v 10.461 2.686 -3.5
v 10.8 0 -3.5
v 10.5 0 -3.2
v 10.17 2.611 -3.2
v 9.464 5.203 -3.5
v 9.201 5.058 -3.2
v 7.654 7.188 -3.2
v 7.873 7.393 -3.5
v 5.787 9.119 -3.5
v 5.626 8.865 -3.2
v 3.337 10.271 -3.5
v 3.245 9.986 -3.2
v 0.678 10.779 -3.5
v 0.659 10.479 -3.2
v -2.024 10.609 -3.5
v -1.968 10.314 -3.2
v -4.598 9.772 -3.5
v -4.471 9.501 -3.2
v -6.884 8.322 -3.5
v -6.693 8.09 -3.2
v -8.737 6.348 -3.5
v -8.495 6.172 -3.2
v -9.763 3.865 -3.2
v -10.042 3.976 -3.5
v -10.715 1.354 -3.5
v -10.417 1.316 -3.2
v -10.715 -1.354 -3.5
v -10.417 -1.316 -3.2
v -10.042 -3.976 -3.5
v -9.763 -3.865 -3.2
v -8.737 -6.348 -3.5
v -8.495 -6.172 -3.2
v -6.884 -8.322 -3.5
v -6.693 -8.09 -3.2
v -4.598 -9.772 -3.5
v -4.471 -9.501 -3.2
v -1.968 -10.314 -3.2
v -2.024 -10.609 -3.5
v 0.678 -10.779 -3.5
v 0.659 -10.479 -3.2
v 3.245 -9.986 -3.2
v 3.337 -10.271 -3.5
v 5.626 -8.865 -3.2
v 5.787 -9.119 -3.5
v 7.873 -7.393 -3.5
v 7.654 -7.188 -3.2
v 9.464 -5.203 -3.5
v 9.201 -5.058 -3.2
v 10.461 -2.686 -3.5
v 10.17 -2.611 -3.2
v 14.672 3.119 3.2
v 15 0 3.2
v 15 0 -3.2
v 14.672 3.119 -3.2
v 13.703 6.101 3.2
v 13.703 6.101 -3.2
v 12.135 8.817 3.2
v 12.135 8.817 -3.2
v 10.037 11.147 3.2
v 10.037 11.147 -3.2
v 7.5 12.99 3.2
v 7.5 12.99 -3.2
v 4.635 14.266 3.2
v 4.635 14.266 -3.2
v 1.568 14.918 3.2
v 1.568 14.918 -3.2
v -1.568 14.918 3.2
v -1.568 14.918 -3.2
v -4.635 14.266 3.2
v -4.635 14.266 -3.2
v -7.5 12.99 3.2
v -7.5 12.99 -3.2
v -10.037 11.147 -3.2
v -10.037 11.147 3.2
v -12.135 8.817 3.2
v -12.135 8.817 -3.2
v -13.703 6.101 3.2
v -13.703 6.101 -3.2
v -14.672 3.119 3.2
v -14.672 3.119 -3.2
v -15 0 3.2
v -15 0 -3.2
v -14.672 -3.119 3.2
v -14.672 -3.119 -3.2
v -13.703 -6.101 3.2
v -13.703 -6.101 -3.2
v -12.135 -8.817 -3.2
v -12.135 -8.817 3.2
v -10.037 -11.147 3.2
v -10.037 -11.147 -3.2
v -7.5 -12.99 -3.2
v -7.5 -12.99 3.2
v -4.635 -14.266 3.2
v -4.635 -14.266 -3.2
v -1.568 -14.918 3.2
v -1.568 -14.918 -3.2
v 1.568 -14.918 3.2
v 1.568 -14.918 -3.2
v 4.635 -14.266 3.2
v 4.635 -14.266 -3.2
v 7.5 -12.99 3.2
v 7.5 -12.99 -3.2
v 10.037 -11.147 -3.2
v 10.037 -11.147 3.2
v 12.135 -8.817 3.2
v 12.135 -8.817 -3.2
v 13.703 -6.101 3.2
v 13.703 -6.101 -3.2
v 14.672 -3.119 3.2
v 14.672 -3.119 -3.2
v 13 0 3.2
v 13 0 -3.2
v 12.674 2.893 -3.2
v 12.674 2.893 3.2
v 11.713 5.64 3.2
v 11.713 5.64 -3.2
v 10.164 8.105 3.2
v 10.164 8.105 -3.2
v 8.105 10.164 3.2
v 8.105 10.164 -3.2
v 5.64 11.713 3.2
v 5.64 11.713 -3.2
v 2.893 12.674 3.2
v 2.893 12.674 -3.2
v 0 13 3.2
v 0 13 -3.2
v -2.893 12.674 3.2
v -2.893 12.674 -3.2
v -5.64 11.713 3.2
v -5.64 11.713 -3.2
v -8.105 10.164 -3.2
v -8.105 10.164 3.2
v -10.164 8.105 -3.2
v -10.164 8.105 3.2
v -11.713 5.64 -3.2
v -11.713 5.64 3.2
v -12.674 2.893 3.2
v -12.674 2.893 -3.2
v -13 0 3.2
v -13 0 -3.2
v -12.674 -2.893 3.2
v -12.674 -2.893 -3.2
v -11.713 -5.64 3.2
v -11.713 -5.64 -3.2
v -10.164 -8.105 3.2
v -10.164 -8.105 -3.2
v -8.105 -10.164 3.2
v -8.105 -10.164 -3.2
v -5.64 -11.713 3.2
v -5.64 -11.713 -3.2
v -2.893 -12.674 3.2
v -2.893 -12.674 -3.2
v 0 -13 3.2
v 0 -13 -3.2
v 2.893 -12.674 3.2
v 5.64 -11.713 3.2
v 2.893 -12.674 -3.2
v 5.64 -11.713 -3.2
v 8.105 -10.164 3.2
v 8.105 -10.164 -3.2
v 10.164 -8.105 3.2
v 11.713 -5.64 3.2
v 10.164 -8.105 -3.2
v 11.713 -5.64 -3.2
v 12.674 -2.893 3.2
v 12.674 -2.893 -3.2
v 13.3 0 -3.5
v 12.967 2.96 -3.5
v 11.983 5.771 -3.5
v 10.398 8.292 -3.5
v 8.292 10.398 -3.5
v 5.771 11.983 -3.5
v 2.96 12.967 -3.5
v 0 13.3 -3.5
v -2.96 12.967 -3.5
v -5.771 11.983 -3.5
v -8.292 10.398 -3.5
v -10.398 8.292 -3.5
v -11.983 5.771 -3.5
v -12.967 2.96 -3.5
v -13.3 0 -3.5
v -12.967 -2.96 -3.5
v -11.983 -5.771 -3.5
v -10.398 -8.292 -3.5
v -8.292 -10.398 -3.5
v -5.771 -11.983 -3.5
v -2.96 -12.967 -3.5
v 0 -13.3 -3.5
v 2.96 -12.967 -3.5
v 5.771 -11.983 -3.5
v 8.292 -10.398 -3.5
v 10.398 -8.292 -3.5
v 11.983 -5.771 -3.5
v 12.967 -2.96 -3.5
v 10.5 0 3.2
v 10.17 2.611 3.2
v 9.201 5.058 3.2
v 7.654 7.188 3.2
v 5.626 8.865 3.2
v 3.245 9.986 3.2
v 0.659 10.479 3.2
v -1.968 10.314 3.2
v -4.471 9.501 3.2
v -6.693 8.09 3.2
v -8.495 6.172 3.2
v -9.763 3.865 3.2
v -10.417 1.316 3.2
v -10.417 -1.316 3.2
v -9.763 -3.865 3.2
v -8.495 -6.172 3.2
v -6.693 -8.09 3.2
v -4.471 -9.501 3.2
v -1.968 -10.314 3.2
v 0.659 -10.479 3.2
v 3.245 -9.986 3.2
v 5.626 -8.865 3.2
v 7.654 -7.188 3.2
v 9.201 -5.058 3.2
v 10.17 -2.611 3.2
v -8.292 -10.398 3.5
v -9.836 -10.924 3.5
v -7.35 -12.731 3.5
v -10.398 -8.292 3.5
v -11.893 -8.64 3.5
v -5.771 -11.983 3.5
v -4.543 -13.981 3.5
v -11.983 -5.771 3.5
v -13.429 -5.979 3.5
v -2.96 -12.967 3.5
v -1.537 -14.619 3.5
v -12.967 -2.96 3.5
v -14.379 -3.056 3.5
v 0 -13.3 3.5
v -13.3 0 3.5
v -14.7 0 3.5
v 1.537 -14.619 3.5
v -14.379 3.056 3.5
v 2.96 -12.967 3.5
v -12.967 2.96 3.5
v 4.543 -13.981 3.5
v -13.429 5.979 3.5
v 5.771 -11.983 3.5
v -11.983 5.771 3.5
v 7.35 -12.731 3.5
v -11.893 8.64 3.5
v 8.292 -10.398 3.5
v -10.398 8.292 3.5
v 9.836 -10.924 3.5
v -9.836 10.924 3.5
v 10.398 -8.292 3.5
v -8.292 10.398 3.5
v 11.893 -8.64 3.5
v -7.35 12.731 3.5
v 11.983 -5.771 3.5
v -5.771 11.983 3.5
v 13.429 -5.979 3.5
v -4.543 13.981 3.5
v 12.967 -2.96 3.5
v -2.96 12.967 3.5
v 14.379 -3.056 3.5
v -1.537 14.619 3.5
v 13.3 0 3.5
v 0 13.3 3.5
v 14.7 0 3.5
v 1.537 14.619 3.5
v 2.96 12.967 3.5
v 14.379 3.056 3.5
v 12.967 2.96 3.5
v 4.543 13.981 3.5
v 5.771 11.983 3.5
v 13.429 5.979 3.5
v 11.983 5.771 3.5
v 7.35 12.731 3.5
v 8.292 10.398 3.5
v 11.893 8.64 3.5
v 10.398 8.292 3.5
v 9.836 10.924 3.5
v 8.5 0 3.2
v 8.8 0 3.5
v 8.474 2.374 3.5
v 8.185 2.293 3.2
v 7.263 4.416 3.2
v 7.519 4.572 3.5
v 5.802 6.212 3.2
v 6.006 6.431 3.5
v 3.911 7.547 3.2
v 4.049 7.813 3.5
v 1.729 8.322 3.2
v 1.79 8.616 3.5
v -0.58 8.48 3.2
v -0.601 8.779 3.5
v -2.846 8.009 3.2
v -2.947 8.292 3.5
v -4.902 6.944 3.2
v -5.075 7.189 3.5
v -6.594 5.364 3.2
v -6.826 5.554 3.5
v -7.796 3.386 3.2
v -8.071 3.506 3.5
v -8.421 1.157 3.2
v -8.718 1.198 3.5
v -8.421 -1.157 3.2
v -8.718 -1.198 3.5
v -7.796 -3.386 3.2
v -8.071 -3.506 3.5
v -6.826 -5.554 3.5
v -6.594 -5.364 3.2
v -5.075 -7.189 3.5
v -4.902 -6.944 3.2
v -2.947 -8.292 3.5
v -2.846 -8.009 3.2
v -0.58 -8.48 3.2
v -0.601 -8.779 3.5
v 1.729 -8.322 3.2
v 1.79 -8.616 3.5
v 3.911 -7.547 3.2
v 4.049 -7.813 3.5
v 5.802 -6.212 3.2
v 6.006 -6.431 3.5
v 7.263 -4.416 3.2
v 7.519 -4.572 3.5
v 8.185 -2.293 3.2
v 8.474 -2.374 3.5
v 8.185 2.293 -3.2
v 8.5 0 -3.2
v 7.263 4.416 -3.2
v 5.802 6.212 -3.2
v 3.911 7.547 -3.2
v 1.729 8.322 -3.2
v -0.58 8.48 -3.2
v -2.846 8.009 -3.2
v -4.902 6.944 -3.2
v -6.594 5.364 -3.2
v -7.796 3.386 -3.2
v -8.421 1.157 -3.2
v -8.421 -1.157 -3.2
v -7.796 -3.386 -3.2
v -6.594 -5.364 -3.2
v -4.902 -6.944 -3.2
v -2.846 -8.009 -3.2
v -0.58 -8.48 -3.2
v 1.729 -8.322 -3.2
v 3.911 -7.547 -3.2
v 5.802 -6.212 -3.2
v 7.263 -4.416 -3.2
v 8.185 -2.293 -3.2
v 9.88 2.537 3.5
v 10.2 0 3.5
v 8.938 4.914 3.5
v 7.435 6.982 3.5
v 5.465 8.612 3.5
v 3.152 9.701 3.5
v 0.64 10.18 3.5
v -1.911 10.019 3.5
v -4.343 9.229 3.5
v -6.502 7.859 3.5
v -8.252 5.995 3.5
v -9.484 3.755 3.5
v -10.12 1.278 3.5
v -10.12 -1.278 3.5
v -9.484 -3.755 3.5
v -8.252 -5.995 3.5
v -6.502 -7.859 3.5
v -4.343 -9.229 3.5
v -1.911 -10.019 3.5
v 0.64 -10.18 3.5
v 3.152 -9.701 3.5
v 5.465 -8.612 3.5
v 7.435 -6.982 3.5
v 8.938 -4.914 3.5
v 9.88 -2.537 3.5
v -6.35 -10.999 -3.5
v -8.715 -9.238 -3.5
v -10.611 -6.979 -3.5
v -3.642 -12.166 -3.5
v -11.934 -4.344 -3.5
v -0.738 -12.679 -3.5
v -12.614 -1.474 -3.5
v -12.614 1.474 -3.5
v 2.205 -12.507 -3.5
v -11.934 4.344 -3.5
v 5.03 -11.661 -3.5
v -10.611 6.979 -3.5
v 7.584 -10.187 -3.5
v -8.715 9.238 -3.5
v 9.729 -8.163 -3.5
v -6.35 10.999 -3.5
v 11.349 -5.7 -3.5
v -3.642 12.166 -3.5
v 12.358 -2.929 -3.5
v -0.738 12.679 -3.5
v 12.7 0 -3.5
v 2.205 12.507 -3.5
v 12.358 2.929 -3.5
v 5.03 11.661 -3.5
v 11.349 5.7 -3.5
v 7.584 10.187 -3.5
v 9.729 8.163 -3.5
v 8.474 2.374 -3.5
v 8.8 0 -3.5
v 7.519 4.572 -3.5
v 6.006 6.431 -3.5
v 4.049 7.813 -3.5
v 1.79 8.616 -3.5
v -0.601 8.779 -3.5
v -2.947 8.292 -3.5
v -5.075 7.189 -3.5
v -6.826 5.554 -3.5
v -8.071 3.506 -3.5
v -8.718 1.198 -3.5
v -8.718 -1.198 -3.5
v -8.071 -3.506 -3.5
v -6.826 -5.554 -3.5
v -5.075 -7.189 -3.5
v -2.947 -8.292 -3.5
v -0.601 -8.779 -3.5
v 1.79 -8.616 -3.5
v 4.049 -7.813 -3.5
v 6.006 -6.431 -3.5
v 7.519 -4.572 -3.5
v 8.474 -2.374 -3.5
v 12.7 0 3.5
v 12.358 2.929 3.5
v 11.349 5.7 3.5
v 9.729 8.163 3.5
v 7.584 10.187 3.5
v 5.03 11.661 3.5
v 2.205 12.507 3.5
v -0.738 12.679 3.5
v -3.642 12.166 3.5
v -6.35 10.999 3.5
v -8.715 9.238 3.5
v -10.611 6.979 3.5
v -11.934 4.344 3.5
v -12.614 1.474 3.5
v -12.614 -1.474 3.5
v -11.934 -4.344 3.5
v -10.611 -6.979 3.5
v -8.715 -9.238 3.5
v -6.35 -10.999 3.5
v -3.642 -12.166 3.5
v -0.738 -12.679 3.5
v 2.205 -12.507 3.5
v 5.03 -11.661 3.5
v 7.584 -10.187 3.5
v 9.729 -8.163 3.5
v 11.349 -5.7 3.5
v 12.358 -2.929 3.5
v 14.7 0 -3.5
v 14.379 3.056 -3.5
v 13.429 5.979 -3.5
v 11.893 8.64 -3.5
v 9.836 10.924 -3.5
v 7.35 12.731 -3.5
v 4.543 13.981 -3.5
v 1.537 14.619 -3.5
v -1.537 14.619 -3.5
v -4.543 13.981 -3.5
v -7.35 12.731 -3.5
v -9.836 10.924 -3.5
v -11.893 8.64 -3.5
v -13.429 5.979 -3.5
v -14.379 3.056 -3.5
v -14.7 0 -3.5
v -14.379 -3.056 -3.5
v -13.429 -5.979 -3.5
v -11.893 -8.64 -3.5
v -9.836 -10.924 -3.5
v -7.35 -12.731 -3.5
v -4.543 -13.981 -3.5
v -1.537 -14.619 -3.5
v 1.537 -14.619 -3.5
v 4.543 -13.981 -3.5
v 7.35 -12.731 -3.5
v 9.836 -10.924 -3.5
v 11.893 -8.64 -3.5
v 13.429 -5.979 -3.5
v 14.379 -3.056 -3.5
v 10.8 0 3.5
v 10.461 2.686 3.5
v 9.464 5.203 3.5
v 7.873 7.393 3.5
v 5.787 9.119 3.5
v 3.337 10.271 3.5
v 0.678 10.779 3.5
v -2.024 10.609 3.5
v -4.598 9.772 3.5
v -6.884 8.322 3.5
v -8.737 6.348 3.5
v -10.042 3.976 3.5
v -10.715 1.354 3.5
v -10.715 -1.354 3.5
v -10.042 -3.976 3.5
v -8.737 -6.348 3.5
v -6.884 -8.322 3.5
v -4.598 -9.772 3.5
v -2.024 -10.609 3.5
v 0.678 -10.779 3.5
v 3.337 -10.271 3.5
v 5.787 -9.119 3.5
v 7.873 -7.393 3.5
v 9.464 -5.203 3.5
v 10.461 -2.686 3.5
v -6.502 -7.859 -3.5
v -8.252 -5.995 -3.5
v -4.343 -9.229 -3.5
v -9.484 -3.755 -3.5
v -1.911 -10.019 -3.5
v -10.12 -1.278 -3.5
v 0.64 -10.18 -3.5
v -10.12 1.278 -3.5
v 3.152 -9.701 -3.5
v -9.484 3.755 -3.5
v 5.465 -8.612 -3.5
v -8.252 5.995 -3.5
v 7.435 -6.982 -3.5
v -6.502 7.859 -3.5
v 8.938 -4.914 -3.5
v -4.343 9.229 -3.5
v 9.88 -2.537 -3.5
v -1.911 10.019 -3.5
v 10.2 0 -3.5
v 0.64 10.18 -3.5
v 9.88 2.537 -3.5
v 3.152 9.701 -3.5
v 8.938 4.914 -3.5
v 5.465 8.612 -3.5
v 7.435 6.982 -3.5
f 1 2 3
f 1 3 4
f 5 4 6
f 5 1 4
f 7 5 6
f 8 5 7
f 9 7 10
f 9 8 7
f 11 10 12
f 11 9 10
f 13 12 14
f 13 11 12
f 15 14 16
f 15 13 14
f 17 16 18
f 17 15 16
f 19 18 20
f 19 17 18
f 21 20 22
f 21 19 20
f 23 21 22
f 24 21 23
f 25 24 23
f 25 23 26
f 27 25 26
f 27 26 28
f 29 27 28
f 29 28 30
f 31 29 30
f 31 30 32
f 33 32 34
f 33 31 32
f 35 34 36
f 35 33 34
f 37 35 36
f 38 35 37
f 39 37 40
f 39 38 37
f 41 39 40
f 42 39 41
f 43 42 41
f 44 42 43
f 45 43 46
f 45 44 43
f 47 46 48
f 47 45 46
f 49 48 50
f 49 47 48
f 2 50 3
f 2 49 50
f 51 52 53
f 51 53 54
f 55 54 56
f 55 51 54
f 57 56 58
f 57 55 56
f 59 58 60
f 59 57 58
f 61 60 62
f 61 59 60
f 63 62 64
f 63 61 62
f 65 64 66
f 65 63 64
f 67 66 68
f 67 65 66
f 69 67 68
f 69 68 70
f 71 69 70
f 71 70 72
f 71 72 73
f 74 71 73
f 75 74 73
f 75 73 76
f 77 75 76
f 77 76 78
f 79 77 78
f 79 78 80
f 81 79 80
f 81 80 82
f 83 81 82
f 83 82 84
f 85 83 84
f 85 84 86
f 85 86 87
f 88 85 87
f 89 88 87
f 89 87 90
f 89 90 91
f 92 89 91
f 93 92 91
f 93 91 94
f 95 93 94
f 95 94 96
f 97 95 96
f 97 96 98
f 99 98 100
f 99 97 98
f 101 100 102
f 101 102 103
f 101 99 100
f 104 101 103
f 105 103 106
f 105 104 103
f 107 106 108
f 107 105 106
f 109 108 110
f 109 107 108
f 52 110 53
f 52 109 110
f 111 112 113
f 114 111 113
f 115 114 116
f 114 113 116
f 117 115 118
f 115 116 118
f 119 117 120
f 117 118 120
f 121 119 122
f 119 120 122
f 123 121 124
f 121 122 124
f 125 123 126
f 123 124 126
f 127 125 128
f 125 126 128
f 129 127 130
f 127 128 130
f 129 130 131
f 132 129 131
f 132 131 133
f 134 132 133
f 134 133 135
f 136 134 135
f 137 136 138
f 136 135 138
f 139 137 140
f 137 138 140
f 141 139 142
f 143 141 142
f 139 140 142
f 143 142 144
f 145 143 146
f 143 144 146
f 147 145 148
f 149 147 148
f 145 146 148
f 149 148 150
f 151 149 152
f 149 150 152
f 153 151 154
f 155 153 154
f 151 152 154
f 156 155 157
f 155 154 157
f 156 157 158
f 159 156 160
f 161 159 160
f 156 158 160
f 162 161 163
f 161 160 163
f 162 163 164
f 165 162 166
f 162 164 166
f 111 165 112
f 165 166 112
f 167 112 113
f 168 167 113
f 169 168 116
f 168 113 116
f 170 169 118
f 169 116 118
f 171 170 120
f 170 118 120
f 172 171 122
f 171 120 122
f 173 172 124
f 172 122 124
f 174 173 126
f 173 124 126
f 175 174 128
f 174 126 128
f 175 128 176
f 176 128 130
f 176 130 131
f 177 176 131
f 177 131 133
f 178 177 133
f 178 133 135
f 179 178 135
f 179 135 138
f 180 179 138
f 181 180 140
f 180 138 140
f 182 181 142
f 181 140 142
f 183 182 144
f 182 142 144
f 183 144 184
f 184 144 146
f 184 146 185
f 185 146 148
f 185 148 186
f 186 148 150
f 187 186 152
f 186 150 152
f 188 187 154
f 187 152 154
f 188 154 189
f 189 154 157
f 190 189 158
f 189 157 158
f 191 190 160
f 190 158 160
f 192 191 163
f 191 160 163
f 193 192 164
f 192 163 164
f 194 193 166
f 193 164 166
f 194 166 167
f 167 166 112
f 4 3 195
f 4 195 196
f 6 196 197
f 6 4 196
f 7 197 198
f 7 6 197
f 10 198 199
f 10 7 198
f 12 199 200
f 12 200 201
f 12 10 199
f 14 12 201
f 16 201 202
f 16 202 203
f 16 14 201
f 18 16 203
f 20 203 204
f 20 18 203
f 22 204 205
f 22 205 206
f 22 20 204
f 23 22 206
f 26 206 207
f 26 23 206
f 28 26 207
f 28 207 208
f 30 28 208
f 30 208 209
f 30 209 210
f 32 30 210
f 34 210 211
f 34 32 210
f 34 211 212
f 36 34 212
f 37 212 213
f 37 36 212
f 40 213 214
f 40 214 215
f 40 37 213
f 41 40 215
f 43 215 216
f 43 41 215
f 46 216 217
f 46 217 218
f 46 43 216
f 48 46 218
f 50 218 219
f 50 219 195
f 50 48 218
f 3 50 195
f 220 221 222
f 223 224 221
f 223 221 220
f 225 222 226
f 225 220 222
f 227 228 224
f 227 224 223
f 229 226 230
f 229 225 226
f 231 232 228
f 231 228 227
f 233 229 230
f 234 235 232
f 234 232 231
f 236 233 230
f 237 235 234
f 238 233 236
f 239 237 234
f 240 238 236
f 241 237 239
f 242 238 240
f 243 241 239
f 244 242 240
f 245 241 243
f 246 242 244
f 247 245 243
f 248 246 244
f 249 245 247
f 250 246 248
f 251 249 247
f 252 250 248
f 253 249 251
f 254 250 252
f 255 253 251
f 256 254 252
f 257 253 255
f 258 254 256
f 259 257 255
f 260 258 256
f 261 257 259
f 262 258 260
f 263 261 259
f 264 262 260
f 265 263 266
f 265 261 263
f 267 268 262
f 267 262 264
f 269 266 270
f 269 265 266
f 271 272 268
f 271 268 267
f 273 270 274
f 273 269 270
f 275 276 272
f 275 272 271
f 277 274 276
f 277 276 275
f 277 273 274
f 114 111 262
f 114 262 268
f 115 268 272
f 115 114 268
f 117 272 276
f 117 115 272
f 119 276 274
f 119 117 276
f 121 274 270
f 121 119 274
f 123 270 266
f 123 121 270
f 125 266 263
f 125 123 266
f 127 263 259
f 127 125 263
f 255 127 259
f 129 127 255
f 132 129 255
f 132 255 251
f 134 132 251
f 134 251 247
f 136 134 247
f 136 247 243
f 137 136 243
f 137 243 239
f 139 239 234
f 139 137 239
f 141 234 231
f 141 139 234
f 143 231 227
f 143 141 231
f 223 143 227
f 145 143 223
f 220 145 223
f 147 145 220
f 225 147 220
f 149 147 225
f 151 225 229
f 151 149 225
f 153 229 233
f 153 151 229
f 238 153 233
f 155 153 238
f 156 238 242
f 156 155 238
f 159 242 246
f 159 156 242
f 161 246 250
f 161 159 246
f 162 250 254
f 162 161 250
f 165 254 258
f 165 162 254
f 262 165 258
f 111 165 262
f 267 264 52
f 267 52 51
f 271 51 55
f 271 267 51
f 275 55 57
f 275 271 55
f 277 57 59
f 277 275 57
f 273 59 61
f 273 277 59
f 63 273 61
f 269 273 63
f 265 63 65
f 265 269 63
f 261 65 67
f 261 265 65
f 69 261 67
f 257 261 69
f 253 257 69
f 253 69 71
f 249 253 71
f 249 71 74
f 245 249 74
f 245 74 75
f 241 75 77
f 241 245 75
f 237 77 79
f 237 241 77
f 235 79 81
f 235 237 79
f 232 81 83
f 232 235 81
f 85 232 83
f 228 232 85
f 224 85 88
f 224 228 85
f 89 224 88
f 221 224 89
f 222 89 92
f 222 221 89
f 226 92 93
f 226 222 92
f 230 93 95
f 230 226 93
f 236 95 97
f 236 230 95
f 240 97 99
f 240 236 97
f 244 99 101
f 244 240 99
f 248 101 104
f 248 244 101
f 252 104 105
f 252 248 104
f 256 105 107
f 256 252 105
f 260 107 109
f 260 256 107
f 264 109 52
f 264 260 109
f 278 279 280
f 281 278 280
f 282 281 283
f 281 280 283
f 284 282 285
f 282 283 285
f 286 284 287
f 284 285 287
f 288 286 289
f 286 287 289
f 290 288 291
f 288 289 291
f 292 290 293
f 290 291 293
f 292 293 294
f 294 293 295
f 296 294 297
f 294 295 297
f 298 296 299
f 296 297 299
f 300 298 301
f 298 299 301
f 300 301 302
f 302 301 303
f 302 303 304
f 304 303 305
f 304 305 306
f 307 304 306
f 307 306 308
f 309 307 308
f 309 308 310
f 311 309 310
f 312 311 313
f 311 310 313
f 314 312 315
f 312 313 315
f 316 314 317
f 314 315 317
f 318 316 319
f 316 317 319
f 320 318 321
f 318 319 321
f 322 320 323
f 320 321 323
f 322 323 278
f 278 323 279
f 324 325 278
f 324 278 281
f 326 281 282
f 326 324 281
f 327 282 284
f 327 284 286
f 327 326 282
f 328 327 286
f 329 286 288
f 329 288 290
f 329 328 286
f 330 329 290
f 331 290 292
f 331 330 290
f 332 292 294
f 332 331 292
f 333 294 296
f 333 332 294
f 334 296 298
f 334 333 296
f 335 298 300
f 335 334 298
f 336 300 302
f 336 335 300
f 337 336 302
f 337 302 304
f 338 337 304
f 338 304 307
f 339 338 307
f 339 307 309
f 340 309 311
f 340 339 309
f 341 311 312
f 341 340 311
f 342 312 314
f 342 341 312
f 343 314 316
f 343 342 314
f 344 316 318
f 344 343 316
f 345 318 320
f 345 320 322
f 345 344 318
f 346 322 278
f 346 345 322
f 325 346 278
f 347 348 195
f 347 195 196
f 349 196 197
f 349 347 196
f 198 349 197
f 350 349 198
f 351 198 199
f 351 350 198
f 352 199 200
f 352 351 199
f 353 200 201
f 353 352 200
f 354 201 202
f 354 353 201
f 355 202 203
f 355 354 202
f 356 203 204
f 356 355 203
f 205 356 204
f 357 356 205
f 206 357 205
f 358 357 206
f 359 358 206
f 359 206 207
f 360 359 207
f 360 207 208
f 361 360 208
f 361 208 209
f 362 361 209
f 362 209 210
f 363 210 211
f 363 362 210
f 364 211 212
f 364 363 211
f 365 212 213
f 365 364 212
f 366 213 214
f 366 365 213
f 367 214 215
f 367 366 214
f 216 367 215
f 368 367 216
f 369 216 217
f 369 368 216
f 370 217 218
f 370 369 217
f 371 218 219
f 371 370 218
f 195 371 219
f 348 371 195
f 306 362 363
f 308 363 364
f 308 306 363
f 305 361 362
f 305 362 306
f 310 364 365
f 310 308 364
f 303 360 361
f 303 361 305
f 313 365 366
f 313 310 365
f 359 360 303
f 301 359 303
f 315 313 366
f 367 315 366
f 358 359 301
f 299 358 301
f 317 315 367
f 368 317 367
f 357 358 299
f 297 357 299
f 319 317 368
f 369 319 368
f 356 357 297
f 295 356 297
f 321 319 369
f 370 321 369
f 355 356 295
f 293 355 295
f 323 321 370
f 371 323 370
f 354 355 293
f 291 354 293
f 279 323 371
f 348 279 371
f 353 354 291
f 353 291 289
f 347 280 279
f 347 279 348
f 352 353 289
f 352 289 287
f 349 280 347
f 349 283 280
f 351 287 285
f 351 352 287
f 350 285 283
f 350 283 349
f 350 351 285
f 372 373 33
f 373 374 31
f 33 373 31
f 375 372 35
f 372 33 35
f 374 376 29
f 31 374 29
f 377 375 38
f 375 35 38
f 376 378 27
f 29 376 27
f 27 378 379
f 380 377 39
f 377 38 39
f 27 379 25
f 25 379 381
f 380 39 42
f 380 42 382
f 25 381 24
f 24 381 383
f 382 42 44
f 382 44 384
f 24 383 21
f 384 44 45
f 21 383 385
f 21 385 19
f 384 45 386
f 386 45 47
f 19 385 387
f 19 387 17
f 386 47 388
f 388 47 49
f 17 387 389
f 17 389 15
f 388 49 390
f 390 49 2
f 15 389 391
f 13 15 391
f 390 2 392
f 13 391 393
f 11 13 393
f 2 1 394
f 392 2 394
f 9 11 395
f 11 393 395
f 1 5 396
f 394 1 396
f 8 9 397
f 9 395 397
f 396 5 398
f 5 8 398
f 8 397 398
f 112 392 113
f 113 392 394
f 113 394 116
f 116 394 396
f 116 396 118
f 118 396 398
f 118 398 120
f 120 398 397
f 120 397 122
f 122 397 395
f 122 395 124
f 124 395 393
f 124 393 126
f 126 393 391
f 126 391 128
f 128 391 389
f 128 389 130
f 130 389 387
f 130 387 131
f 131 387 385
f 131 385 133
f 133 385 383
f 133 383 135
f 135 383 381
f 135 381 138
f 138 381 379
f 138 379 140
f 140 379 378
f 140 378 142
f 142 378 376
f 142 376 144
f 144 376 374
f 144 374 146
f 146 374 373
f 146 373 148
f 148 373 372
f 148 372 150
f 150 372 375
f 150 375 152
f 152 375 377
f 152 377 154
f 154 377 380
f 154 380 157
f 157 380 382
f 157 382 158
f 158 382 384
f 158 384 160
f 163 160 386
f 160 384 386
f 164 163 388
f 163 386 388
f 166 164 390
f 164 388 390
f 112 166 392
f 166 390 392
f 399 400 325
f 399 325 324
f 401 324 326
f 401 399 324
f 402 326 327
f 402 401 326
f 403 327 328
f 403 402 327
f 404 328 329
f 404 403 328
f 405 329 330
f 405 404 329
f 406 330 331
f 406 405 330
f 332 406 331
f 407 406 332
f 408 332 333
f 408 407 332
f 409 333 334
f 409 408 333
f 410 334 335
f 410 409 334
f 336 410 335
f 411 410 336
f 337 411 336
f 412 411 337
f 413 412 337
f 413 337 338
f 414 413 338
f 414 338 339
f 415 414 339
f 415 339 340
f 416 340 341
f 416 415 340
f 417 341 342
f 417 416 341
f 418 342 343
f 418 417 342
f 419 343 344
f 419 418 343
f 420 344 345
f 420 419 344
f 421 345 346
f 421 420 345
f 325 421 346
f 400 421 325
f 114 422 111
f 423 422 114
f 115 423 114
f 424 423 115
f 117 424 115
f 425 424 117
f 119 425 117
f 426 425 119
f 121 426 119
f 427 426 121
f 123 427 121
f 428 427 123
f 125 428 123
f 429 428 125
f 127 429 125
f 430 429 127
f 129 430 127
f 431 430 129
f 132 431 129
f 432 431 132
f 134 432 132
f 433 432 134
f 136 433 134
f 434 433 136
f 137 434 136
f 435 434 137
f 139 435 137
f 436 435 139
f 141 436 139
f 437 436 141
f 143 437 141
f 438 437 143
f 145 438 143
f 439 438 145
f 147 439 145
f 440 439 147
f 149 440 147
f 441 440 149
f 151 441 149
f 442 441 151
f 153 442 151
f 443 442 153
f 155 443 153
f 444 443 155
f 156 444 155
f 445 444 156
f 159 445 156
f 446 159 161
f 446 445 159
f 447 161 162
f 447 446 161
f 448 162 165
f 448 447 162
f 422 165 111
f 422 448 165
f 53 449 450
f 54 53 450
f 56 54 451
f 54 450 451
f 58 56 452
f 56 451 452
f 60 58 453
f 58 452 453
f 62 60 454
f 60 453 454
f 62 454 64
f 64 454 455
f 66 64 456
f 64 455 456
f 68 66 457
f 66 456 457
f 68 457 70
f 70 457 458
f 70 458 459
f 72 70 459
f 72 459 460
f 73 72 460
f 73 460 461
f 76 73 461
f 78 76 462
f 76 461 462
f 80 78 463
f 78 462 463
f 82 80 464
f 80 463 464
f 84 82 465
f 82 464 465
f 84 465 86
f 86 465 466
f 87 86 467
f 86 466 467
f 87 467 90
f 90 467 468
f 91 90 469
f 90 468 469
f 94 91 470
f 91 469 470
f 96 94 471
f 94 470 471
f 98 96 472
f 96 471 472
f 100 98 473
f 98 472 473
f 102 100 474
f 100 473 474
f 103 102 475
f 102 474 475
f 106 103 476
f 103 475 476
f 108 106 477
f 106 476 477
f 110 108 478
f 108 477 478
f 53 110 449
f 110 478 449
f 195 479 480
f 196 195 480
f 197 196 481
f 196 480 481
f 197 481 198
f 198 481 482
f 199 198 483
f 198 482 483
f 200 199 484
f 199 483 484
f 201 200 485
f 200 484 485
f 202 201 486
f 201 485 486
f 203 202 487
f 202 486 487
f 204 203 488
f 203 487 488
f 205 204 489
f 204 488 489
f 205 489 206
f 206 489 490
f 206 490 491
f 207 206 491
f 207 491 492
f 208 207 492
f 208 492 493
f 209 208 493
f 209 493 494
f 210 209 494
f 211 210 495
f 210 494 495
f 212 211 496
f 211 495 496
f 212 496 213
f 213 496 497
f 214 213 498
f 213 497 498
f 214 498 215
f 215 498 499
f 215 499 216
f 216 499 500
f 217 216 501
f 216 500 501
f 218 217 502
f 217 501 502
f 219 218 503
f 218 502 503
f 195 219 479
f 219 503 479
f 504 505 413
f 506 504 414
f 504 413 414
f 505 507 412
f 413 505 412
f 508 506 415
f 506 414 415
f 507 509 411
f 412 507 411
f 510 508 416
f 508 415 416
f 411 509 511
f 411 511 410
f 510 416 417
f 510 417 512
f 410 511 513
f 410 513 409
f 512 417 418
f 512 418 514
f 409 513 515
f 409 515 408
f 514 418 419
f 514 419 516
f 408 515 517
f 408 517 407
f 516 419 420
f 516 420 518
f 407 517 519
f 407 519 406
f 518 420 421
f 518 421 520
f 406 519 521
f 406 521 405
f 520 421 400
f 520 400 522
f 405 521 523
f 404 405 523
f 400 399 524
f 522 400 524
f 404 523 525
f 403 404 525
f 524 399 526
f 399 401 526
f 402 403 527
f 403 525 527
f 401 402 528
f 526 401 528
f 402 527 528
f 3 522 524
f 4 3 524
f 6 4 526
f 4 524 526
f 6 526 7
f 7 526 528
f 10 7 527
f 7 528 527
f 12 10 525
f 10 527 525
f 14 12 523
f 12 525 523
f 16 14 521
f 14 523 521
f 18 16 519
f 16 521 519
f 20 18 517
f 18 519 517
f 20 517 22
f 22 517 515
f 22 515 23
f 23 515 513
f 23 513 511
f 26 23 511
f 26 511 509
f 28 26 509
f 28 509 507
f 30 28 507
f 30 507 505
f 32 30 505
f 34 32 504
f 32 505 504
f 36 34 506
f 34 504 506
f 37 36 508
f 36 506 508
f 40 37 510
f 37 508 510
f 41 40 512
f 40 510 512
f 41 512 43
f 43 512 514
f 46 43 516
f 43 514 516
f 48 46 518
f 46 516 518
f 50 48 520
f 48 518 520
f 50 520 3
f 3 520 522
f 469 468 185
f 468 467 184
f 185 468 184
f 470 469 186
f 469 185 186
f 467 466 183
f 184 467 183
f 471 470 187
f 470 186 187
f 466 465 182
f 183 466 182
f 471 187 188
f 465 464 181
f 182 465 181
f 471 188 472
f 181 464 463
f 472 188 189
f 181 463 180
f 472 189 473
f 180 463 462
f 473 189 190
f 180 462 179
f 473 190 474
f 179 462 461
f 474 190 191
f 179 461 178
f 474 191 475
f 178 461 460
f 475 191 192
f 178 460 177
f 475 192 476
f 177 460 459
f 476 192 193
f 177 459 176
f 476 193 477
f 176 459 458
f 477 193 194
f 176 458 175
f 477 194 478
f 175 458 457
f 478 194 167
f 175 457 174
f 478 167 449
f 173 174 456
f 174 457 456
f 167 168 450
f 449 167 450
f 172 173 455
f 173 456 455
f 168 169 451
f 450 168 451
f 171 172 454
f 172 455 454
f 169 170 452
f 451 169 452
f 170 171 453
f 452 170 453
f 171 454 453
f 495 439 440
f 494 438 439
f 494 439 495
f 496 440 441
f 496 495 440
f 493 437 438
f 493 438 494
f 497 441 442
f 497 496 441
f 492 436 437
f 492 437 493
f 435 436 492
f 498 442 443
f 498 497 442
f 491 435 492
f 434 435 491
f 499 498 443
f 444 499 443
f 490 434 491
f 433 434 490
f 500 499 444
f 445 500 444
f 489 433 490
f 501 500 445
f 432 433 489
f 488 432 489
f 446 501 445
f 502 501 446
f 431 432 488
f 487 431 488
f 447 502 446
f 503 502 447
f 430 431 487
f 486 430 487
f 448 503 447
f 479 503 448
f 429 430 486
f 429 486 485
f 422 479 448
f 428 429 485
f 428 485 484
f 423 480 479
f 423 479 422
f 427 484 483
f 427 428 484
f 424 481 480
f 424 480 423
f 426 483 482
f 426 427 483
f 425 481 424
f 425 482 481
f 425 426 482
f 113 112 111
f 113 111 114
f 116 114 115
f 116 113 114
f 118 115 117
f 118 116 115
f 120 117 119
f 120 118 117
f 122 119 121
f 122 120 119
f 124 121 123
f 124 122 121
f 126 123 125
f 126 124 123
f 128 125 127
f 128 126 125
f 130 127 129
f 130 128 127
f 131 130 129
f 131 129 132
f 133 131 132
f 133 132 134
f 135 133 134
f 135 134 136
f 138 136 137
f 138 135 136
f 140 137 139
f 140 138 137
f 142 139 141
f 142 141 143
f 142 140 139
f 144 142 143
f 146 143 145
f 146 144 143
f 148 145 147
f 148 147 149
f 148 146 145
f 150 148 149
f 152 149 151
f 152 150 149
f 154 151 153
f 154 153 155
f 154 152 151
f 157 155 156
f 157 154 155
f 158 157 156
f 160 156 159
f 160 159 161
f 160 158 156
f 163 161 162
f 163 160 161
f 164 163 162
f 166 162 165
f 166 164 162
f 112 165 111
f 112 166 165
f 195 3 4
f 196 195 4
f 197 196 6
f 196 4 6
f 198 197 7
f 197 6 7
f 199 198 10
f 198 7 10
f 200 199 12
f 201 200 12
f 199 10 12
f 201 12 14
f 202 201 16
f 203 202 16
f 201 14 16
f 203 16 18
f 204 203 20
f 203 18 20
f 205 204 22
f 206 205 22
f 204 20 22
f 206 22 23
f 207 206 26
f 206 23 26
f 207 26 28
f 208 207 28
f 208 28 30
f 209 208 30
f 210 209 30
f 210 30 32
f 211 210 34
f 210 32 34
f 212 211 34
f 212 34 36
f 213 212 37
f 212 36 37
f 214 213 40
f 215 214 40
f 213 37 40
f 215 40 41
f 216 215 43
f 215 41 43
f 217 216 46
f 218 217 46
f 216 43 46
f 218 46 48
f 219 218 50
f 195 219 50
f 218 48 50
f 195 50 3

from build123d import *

# Parameters (mm, degrees)
SKETCH1_R            = 15
SKETCH1_R_2          = 8.5
EXTRUDE1_DEPTH       = 3.5
SPLIT1_START         = -3.5
SPLIT1_OUTLINE_R     = 10.5
SPLIT1_OUTLINE_R_2   = 8.5
SPLIT1_DEPTH         = 7
SPLIT1_2_OUTLINE_R   = 13
SPLIT1_2_OUTLINE_R_2 = 10.5
SPLIT1_2_DEPTH       = 7
SPLIT1_3_OUTLINE_R   = 13
SPLIT1_3_OUTLINE_R_2 = 8.5
SPLIT1_3_DEPTH       = 7
CHAMFER1_SIZE        = 0.3
CHAMFER2_SIZE        = 0.3
CHAMFER3_SIZE        = 0.3


# Read off the part's stored shape, not the designer's step: Split1
with BuildPart() as part:
    # Sketch1 → Extrude1 (new, symmetric)
    with BuildSketch(Plane.XY):
        Circle(SKETCH1_R)
        Circle(SKETCH1_R_2, mode=Mode.SUBTRACT)
    extrude(amount=EXTRUDE1_DEPTH, both=True)

    # Split1 3 outline → Split1 3 (cut)
    with BuildSketch(Plane.XY.offset(SPLIT1_START)):
        Circle(SPLIT1_3_OUTLINE_R)
        Circle(SPLIT1_3_OUTLINE_R_2, mode=Mode.SUBTRACT)
    extrude(amount=SPLIT1_3_DEPTH, mode=Mode.SUBTRACT)

    # Chamfer1
    chamfer1_edges = [part.edges().sort_by_distance(p)[0] for p in [
        (-13, 0, -3.5),
        (-15, 0, -3.5),
        (-13, 0, 3.5),
        (-15, 0, 3.5),
    ]]
    chamfer(chamfer1_edges, length=CHAMFER1_SIZE)


with BuildPart() as body_2:
    # Split1 outline → Split1 (new body)
    with BuildSketch(Plane.XY.offset(SPLIT1_START)):
        Circle(SPLIT1_OUTLINE_R)
        Circle(SPLIT1_OUTLINE_R_2, mode=Mode.SUBTRACT)
    extrude(amount=SPLIT1_DEPTH)

    # Chamfer3
    chamfer3_edges = [body_2.edges().sort_by_distance(p)[0] for p in [
        (-8.5, 0, -3.5),
        (-8.5, 0, 3.5),
        (-10.5, 0, 3.5),
        (-10.5, 0, -3.5),
    ]]
    chamfer(chamfer3_edges, length=CHAMFER3_SIZE)


with BuildPart() as body_3:
    # Split1 2 outline → Split1 2 (new body)
    with BuildSketch(Plane.XY.offset(SPLIT1_START)):
        Circle(SPLIT1_2_OUTLINE_R)
        Circle(SPLIT1_2_OUTLINE_R_2, mode=Mode.SUBTRACT)
    extrude(amount=SPLIT1_2_DEPTH)

    # Chamfer2
    chamfer2_edges = [body_3.edges().sort_by_distance(p)[0] for p in [
        (-10.5, 0, -3.5),
        (-13, 0, 3.5),
        (-10.5, 0, 3.5),
        (-13, 0, -3.5),
    ]]
    chamfer(chamfer2_edges, length=CHAMFER2_SIZE)


solid = Compound([part.part, body_2.part, body_3.part])
